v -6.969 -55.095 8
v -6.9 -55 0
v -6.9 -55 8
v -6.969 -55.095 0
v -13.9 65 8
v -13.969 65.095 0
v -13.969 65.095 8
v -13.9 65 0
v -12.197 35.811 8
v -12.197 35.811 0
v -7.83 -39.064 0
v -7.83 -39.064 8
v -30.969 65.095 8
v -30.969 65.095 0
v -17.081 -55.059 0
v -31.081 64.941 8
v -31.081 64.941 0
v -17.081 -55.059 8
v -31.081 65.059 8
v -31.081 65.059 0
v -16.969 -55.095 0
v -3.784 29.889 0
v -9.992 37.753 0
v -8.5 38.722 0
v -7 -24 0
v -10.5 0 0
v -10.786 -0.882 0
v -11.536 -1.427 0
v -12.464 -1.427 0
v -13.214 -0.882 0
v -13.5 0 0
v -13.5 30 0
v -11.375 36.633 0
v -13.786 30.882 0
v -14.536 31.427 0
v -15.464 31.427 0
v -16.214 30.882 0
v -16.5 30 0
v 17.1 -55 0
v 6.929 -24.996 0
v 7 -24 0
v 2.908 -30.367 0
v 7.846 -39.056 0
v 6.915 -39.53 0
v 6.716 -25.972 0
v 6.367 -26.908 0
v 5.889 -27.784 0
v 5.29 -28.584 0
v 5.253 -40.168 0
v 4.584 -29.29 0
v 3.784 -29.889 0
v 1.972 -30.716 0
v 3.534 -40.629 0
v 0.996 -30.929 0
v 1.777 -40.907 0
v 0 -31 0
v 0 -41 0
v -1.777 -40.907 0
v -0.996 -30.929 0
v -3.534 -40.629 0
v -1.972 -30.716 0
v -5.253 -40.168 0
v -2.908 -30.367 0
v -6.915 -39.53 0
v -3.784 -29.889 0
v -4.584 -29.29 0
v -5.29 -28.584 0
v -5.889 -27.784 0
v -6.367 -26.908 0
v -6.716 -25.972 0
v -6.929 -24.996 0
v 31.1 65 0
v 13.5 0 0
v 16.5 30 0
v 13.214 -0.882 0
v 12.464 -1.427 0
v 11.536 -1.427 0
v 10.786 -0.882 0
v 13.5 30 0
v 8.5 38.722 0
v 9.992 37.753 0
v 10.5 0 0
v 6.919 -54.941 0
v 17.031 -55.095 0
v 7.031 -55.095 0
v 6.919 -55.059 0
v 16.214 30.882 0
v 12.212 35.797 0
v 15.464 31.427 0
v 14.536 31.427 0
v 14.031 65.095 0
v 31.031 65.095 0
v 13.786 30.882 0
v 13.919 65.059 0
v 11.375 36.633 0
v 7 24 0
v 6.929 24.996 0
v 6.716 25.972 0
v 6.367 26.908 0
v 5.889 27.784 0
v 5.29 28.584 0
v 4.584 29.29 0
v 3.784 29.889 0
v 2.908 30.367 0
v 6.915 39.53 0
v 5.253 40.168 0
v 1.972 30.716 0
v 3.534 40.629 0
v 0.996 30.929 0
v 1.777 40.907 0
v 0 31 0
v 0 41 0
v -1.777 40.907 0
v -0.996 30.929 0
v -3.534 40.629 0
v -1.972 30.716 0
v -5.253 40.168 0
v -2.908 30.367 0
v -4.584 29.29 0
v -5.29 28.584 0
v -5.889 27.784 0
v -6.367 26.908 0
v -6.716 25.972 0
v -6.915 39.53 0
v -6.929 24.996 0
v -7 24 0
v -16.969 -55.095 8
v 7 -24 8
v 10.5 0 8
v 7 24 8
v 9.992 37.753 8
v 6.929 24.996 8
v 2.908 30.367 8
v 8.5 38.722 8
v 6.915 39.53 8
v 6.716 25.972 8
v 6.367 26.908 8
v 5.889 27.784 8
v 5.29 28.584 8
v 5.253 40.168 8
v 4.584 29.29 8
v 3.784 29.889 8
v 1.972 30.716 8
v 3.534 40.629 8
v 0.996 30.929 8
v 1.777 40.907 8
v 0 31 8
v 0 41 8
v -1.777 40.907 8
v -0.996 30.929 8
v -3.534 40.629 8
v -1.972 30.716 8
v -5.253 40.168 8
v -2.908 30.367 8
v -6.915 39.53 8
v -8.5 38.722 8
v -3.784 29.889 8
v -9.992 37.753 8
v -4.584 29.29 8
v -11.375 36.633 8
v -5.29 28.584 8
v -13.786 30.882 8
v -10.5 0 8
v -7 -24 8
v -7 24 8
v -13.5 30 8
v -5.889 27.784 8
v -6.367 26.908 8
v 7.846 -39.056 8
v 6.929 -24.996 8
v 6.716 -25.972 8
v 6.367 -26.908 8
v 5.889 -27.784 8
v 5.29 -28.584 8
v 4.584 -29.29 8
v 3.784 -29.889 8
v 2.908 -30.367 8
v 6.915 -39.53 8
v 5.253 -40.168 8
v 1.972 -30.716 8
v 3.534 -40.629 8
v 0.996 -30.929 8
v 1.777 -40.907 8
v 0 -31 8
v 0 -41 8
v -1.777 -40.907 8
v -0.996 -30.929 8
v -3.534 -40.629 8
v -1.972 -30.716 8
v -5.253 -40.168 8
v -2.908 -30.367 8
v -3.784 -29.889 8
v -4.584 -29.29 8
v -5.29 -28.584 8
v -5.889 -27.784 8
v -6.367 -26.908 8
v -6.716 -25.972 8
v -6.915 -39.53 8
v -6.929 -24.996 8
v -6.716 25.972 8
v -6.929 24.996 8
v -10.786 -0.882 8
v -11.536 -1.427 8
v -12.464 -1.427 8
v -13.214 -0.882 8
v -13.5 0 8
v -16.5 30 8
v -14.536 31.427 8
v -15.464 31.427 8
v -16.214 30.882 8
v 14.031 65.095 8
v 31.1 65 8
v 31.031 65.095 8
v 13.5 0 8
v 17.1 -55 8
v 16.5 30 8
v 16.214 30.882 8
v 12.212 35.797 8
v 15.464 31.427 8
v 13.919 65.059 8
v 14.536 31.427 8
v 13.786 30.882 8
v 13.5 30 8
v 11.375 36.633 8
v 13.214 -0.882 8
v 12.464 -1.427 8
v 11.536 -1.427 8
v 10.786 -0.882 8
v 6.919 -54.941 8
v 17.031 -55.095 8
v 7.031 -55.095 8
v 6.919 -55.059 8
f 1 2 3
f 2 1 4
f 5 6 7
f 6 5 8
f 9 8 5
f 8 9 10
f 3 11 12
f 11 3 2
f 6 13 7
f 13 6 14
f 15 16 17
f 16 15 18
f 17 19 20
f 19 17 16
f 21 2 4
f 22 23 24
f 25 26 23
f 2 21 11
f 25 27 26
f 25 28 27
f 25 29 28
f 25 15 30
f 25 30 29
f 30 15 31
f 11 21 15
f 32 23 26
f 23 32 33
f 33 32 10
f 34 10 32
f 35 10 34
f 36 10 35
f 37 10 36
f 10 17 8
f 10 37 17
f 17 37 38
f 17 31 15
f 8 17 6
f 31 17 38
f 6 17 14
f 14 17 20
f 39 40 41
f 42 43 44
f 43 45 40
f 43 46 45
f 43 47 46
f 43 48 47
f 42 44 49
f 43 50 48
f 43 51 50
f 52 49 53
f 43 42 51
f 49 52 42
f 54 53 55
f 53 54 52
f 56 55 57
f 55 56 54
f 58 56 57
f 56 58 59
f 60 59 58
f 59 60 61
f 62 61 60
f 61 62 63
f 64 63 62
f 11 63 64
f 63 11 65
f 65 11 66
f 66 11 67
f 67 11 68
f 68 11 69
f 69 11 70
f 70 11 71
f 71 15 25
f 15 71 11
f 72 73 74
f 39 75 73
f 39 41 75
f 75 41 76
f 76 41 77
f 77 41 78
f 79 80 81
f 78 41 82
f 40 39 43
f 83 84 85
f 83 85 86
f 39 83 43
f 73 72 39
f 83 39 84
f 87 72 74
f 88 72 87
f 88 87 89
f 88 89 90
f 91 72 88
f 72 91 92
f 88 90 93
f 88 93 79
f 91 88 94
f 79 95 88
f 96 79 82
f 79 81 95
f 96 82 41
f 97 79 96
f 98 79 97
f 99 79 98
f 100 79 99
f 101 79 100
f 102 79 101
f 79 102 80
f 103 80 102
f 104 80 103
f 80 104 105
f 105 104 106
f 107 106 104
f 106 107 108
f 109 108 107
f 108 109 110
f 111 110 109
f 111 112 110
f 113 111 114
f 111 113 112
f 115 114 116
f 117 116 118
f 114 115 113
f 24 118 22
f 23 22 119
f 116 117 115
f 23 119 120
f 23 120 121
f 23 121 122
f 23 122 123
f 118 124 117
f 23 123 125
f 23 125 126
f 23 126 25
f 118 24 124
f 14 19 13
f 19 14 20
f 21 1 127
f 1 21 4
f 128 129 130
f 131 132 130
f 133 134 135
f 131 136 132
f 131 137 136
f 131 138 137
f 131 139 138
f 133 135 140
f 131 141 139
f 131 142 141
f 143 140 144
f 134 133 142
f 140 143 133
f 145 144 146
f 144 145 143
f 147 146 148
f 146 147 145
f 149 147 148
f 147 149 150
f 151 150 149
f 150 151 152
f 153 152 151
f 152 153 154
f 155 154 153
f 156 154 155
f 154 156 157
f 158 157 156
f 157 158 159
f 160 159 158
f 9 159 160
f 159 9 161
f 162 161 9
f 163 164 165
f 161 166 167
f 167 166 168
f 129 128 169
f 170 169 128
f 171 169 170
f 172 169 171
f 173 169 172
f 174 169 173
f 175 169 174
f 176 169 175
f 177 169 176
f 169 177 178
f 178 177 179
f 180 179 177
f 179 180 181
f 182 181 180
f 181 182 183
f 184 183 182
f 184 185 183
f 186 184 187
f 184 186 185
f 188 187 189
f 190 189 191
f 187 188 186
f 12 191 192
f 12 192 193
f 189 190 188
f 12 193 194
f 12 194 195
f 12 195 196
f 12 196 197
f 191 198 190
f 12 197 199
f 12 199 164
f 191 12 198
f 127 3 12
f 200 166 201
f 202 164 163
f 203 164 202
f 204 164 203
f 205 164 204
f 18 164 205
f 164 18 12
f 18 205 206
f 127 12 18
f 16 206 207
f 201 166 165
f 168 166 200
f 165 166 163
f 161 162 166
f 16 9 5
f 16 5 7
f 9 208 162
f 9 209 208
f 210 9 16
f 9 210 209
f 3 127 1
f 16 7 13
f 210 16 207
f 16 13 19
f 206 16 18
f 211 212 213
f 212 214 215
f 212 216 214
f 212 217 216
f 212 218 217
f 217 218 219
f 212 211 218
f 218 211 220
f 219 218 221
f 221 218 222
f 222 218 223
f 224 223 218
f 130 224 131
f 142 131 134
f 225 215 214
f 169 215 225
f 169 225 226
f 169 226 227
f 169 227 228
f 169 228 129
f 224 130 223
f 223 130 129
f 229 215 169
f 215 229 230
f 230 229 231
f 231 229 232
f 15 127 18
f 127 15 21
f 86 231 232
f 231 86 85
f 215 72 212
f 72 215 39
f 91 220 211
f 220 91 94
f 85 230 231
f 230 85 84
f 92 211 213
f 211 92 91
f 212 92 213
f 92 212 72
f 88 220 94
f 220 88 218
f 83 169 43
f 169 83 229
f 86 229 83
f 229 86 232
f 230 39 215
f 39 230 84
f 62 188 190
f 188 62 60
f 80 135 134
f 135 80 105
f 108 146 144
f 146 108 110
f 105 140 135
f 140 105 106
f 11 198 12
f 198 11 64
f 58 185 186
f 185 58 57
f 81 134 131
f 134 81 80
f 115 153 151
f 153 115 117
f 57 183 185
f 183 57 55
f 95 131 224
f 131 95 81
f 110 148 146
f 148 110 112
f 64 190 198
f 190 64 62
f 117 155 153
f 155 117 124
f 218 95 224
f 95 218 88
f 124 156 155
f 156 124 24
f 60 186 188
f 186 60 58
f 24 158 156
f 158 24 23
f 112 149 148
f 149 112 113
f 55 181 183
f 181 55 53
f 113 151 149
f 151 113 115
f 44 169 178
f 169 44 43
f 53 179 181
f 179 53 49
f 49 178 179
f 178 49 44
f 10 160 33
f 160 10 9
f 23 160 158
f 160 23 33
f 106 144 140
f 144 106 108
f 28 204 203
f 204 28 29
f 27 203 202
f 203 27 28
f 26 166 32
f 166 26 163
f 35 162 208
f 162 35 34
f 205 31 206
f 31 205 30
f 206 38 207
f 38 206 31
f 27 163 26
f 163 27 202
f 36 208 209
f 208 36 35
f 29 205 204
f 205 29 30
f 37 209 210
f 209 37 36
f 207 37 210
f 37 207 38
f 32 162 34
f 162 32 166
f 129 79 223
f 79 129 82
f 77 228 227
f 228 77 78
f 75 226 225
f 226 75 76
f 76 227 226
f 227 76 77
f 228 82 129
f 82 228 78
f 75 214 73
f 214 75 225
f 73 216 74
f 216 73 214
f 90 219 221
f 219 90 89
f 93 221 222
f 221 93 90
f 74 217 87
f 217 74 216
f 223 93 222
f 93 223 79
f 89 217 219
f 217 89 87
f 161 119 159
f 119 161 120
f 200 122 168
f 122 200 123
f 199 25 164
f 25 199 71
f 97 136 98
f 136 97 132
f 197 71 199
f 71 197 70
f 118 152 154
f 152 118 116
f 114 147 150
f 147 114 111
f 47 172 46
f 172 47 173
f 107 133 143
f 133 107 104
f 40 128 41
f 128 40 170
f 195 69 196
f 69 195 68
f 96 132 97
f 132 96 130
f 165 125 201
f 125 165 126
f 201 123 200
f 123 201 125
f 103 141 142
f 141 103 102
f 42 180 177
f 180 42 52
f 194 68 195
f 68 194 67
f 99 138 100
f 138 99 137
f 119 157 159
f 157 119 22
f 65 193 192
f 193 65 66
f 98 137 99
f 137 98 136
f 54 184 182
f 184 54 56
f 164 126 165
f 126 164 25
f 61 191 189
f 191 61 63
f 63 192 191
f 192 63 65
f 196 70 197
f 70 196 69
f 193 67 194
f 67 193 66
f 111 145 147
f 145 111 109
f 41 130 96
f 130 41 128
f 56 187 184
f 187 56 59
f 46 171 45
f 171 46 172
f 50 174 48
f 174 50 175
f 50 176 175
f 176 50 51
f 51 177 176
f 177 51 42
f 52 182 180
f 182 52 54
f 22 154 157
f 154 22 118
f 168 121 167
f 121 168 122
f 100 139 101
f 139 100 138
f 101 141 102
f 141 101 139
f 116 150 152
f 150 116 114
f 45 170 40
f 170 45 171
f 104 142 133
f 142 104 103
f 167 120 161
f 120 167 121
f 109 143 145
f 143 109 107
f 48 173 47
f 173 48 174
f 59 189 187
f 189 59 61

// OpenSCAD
$fs=$fs/2;
$fa=$fa/2;

h=8;

difference(){
    union(){
        hull(){
            translate([ 0,62/2-7, 0]) cylinder(r=17, h);
            translate([ 0,-62/2+7, 0]) cylinder(r=17, h);
        }
        
        for(i=[-1,1]){
            hull(){
                translate([ i*7, -55, 0]) cylinder(r=0.1, h);
                translate([ i*(7+10),-55, 0]) cylinder(r=0.1, h);
                translate([ i*14, 65, 0]) cylinder(r=0.1, h);
                translate([ i*(17+14), 65, 0]) cylinder(r=0.1, h); //14+14, 16+14
            }
        }
    }
    
    hull(){
        translate([ 0,62/2-7, -1]) cylinder(r=7, h+2);
        translate([ 0,-62/2+7, -1]) cylinder(r=7, h+2);
    }
    
    for(i=[-1,1]){
        hull(){
            translate([ i*12,0, -1]) cylinder(r=1.5, h+2);
            translate([ i*15, 30, -1]) cylinder(r=1.5, h+2);
        }
    }
}


//

//moteur2();

//support_moteur();
